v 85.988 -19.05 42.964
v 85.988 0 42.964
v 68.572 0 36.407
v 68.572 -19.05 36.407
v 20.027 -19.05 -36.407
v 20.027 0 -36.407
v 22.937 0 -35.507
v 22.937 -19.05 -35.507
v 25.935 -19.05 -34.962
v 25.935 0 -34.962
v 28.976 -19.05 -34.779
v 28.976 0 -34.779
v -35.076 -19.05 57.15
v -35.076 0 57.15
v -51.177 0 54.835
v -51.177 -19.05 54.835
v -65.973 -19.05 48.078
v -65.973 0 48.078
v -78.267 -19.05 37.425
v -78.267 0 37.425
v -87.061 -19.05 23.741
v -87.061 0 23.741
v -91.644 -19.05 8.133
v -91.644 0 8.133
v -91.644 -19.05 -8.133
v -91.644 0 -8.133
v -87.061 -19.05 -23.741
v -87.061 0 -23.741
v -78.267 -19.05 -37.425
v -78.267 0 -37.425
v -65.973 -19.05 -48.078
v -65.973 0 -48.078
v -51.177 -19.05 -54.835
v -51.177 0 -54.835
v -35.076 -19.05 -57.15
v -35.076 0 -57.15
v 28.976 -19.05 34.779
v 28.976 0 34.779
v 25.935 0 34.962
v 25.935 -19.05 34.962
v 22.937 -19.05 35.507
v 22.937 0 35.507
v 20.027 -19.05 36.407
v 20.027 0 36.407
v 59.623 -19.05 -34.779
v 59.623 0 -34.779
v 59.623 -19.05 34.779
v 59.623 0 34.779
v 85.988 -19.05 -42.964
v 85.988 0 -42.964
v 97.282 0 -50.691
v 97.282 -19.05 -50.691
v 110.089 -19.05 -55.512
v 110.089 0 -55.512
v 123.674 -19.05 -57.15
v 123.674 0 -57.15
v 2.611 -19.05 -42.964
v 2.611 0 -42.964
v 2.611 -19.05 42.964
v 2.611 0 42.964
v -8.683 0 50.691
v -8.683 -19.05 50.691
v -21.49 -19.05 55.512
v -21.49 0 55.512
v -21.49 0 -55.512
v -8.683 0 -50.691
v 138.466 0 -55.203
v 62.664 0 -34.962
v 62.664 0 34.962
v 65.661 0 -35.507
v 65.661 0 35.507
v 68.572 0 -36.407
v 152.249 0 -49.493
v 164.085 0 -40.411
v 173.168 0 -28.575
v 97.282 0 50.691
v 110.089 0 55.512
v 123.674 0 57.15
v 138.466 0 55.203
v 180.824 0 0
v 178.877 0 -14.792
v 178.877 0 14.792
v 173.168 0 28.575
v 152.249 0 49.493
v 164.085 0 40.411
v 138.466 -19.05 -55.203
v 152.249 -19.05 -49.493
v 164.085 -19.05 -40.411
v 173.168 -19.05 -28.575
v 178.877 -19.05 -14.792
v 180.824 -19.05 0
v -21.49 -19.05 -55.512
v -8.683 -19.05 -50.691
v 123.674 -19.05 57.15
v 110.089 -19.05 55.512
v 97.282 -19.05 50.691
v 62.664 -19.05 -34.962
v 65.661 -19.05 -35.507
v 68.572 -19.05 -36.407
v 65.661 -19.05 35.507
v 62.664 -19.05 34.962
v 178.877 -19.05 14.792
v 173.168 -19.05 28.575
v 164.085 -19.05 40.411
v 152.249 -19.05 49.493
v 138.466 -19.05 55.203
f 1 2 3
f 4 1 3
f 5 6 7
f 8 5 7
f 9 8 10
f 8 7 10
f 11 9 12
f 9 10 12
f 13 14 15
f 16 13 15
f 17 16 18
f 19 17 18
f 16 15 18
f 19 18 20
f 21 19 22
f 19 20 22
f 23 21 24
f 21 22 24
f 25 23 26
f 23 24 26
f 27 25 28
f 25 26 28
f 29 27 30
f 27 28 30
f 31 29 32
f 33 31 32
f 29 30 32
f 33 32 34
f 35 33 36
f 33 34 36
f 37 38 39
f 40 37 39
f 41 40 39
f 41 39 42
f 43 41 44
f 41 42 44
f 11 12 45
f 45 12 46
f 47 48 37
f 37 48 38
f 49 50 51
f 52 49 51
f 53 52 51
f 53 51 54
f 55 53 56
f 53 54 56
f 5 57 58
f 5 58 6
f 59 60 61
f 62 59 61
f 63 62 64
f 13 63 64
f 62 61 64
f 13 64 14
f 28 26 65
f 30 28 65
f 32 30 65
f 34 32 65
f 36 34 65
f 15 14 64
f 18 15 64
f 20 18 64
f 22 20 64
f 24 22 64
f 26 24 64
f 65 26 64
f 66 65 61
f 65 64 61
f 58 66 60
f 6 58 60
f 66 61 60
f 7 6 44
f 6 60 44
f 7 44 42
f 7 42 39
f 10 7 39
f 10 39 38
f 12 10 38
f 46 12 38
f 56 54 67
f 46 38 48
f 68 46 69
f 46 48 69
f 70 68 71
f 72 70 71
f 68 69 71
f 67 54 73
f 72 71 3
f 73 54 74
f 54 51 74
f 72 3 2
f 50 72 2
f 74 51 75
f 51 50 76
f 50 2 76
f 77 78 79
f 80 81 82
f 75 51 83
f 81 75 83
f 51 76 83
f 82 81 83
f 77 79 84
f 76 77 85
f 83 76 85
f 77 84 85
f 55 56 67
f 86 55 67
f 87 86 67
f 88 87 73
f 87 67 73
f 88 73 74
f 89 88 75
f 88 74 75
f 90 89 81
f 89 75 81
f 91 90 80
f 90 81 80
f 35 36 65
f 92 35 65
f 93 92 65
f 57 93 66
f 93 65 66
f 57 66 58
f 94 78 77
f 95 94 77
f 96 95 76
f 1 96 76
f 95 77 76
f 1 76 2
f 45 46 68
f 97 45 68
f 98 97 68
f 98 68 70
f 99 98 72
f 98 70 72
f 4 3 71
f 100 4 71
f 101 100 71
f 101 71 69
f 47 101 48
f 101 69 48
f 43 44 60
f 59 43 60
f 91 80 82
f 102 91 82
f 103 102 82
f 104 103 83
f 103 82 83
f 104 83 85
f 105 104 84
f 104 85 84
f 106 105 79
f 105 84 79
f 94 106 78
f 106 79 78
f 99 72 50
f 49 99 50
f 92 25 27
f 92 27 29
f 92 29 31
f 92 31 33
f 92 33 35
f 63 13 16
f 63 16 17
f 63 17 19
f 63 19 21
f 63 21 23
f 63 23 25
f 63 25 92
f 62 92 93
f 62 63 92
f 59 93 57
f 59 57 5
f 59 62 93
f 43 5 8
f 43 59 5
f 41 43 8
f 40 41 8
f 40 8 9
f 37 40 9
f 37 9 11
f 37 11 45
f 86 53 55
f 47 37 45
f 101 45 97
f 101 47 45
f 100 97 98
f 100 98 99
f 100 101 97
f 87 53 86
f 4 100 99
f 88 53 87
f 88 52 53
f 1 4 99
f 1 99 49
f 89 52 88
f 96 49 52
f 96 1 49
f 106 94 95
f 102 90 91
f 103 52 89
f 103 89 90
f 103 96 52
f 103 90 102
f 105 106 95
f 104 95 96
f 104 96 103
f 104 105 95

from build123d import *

# Parameters (mm, degrees)
F1_DEPTH = 19.05


with BuildPart() as f1:
    # F0 (on Front) → F1 (new body)
    with BuildSketch(Plane.XZ):
        with BuildLine():
            Line((20.027097595, 36.4074036121), (2.6105293283, 42.9636023111))
            ThreePointArc((2.6105293283, 42.9636023111), (16.9814393634, 23.5834144733), (22.0743066938, 0))
            ThreePointArc((22.0743066938, 0), (16.9814393634, -23.5834144733), (2.6105293283, -42.9636023111))
            Line((2.6105293283, -42.9636023111), (20.027097595, -36.4074036121))
            ThreePointArc((20.027097595, -36.4074036121), (24.4278254251, -35.189367606), (28.975523916, -34.7789341976))
            Line((28.975523916, -34.7789341976), (59.6230894717, -34.7789341976))
            ThreePointArc((59.6230894717, -34.7789341976), (64.1707879626, -35.189367606), (68.5715157927, -36.4074036121))
            Line((68.5715157927, -36.4074036121), (85.9880840594, -42.9636023111))
            ThreePointArc((85.9880840594, -42.9636023111), (66.5243066938, 0), (85.9880840594, 42.9636023111))
            Line((85.9880840594, 42.9636023111), (68.5715157927, 36.4074036121))
            ThreePointArc((68.5715157927, 36.4074036121), (64.1707879626, 35.189367606), (59.6230894717, 34.7789341976))
            Line((59.6230894717, 34.7789341976), (28.975523916, 34.7789341976))
            ThreePointArc((28.975523916, 34.7789341976), (24.4278254251, 35.189367606), (20.027097595, 36.4074036121))
        make_face()
        with BuildLine():
            ThreePointArc((2.6105293283, 42.9636023111), (-14.941734084, 53.4859438174), (-35.0756933062, 57.15))
            Line((-35.0756933062, 57.15), (2.6105293283, 42.9636023111))
        make_face()
        with BuildLine():
            Line((123.6743066938, 57.15), (85.9880840594, 42.9636023111))
            ThreePointArc((85.9880840594, 42.9636023111), (66.5243066938, 0), (85.9880840594, -42.9636023111))
            Line((85.9880840594, -42.9636023111), (123.6743066938, -57.15))
            ThreePointArc((123.6743066938, -57.15), (164.0854592386, -40.4111525448), (180.8243066938, 0))
            ThreePointArc((180.8243066938, 0), (164.0854592386, 40.4111525448), (123.6743066938, 57.15))
        make_face()
        with BuildLine():
            ThreePointArc((123.6743066938, 57.15), (103.5403474717, 53.4859438174), (85.9880840594, 42.9636023111))
            Line((85.9880840594, 42.9636023111), (123.6743066938, 57.15))
        make_face()
        with BuildLine():
            Line((2.6105293283, 42.9636023111), (-35.0756933062, 57.15))
            ThreePointArc((-35.0756933062, 57.15), (-92.2256933062, 0), (-35.0756933062, -57.15))
            Line((-35.0756933062, -57.15), (2.6105293283, -42.9636023111))
            ThreePointArc((2.6105293283, -42.9636023111), (16.9814393634, -23.5834144733), (22.0743066938, 0))
            ThreePointArc((22.0743066938, 0), (16.9814393634, 23.5834144733), (2.6105293283, 42.9636023111))
        make_face()
        with BuildLine():
            Line((2.6105293283, -42.9636023111), (-35.0756933062, -57.15))
            ThreePointArc((-35.0756933062, -57.15), (-14.941734084, -53.4859438174), (2.6105293283, -42.9636023111))
        make_face()
        with BuildLine():
            Line((123.6743066938, -57.15), (85.9880840594, -42.9636023111))
            ThreePointArc((85.9880840594, -42.9636023111), (103.5403474717, -53.4859438174), (123.6743066938, -57.15))
        make_face()
    extrude(amount=F1_DEPTH)


solid = f1.part
